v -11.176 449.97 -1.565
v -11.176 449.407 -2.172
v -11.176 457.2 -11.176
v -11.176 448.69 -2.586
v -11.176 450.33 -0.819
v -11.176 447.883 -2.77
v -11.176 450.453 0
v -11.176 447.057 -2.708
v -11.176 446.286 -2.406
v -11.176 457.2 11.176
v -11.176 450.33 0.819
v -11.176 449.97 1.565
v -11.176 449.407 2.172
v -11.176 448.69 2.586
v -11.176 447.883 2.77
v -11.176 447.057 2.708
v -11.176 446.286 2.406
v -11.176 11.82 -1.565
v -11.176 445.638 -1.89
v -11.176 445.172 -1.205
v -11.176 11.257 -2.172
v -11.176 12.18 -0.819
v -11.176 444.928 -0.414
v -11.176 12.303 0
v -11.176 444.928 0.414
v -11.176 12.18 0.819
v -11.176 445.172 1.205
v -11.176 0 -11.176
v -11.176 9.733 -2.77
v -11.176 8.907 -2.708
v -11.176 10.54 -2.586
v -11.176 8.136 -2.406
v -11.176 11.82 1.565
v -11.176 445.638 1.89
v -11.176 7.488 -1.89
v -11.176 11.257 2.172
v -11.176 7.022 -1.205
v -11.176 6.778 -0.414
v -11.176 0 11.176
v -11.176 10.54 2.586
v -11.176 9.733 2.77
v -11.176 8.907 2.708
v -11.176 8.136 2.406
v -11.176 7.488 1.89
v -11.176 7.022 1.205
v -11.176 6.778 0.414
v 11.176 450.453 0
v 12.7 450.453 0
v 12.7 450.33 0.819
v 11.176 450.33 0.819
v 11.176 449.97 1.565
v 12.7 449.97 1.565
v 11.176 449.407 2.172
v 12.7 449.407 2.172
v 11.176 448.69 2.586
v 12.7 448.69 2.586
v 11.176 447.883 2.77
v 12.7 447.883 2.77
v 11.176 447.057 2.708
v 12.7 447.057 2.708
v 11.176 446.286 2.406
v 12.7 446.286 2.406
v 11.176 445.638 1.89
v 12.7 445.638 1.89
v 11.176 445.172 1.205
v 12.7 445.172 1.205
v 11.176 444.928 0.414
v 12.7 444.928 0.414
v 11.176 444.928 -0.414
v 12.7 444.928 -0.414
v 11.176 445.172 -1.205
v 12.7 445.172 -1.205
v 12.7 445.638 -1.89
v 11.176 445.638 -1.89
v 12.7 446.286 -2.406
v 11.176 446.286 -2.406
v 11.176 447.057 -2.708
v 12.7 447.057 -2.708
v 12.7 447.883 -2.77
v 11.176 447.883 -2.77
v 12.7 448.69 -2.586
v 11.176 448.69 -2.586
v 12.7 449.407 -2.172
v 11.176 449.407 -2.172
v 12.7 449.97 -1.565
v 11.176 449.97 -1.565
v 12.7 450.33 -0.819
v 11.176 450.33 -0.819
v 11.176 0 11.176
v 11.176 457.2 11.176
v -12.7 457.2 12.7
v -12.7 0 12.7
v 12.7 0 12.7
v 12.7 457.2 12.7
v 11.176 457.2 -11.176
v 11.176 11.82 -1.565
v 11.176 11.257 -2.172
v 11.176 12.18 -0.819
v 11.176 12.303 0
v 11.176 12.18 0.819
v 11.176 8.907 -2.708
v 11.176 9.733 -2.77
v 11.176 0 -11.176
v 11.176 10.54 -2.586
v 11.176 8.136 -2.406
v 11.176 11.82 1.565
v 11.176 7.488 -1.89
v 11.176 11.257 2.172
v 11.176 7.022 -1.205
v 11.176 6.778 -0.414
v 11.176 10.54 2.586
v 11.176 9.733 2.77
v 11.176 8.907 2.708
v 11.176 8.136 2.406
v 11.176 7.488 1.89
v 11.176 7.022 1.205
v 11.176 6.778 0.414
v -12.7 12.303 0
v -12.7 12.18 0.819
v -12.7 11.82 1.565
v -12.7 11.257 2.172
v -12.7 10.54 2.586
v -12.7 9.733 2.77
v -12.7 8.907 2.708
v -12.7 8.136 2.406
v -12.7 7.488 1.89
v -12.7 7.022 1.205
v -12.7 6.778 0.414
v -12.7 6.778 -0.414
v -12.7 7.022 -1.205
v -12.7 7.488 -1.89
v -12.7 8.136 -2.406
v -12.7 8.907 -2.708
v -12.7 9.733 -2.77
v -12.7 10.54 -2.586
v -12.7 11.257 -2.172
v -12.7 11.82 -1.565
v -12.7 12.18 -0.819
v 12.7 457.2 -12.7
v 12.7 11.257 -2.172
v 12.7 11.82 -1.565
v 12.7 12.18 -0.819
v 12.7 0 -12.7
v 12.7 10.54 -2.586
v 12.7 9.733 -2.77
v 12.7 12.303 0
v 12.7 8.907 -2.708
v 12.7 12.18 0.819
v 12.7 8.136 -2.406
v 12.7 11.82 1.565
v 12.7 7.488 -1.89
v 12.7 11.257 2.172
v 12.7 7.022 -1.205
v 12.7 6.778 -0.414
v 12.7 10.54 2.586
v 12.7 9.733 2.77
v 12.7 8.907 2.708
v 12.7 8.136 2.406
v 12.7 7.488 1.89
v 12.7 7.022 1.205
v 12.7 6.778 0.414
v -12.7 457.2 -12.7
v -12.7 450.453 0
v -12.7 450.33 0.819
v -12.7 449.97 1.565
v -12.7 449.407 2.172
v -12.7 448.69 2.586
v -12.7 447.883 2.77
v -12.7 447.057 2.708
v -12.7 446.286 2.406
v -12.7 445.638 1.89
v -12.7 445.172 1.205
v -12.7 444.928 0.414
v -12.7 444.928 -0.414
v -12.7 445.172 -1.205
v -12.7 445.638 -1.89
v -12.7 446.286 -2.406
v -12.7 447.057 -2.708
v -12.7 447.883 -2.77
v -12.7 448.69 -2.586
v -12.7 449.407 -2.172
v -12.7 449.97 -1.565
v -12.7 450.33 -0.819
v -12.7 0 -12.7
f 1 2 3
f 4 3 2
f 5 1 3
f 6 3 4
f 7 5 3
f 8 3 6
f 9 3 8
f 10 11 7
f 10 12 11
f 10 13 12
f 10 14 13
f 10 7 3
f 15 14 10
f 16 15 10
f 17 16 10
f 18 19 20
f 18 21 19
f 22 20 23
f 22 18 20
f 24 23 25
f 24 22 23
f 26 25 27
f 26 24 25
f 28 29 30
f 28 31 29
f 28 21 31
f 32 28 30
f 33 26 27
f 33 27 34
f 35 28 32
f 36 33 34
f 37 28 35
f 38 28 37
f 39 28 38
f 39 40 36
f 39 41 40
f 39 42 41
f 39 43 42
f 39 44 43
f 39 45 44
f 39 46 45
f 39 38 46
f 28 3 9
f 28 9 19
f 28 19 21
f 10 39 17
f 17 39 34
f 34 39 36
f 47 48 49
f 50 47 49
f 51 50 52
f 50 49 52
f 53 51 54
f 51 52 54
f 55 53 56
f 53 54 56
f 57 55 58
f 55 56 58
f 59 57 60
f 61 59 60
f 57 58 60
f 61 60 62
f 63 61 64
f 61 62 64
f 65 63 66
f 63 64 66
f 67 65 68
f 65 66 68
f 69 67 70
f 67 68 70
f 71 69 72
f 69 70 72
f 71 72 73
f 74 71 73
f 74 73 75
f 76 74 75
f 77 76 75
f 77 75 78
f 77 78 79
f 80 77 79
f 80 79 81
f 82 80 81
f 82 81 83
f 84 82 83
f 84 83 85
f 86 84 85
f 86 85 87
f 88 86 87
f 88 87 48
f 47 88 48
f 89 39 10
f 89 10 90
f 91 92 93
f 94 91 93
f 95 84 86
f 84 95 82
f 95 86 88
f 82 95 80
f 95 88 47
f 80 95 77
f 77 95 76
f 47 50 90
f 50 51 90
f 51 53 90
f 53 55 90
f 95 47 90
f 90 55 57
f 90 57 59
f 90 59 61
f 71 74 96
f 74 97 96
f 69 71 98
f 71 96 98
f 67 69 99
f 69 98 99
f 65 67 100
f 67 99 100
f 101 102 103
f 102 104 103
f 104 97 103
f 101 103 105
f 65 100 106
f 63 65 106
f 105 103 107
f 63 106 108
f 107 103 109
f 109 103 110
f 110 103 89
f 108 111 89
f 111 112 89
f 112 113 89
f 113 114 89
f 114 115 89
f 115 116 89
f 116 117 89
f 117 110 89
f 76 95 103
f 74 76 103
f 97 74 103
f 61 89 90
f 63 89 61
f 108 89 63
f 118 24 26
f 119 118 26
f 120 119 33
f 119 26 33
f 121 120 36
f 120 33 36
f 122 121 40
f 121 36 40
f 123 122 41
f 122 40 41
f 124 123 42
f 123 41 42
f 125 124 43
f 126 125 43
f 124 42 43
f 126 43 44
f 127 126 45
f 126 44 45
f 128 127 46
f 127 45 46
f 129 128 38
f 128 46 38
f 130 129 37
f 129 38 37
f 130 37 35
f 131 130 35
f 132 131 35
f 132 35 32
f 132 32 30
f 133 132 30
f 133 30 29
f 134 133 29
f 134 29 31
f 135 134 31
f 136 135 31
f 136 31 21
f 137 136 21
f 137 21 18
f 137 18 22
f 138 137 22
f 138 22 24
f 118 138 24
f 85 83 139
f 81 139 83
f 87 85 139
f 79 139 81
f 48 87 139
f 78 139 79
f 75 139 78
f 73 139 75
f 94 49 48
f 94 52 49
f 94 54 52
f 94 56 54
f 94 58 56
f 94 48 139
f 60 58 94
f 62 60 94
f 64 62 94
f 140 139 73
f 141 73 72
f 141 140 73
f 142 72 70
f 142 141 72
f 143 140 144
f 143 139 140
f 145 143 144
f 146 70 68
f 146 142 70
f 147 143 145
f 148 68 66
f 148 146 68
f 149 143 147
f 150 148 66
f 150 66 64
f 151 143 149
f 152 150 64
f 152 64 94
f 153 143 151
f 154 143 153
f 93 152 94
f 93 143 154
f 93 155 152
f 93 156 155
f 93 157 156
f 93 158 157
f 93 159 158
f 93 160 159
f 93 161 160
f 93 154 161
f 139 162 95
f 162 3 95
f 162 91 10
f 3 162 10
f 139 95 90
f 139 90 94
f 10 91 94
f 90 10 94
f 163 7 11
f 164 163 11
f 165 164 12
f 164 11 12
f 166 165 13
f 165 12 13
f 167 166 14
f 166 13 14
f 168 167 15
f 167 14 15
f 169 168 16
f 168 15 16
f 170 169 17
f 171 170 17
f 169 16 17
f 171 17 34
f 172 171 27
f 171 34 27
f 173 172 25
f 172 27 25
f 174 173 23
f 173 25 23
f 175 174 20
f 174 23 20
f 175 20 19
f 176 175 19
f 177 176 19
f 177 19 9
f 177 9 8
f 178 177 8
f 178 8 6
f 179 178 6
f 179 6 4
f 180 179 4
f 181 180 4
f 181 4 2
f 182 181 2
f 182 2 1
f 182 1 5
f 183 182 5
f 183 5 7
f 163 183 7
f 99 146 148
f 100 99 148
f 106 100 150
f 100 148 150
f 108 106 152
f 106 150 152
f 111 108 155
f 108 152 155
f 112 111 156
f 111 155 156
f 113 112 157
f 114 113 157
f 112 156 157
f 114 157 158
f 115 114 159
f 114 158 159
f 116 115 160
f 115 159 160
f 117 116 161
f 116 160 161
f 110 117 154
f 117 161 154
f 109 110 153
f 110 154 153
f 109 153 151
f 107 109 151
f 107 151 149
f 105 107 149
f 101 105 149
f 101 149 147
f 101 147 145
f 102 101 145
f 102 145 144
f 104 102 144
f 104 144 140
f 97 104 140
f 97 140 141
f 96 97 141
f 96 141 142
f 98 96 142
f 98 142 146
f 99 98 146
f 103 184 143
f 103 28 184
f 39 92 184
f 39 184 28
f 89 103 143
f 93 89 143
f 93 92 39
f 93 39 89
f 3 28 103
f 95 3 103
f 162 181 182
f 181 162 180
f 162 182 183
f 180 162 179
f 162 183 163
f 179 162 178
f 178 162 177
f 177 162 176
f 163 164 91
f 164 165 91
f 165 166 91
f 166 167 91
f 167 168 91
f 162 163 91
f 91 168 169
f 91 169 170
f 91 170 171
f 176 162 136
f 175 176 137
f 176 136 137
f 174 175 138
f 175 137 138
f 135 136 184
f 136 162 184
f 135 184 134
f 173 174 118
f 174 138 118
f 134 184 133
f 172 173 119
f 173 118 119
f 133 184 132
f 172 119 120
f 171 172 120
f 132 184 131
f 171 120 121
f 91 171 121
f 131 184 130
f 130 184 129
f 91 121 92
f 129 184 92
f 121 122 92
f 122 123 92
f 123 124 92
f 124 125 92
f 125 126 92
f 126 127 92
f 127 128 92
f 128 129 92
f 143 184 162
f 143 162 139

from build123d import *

# Parameters (mm, degrees)
F0_W     = 25.4
F0_H     = 25.4
F0_W_2   = 22.352
F0_H_2   = 22.352
F1_DEPTH = 457.2
F2_R     = 2.778125
F3_DEPTH = 25.4
F4_R     = 2.778125
F5_DEPTH = 25.4


with BuildPart() as f1:
    # F0 (on Front) → F1 (new body)
    with BuildSketch(Plane.XZ):
        Rectangle(F0_W, F0_H)
        Rectangle(F0_W_2, F0_H_2, mode=Mode.SUBTRACT)
    extrude(amount=-F1_DEPTH)

    # F2 (on face) → F3 (cut)
    with BuildSketch(Plane.YZ.offset(12.7)):
        with Locations((9.525, 0)):
            Circle(F2_R)
    extrude(amount=-F3_DEPTH, mode=Mode.SUBTRACT)

    # F4 (on face) → F5 (cut)
    with BuildSketch(Plane.YZ.offset(12.7)):
        with Locations((447.675, 0)):
            Circle(F4_R)
    extrude(amount=-F5_DEPTH, mode=Mode.SUBTRACT)


solid = f1.part
